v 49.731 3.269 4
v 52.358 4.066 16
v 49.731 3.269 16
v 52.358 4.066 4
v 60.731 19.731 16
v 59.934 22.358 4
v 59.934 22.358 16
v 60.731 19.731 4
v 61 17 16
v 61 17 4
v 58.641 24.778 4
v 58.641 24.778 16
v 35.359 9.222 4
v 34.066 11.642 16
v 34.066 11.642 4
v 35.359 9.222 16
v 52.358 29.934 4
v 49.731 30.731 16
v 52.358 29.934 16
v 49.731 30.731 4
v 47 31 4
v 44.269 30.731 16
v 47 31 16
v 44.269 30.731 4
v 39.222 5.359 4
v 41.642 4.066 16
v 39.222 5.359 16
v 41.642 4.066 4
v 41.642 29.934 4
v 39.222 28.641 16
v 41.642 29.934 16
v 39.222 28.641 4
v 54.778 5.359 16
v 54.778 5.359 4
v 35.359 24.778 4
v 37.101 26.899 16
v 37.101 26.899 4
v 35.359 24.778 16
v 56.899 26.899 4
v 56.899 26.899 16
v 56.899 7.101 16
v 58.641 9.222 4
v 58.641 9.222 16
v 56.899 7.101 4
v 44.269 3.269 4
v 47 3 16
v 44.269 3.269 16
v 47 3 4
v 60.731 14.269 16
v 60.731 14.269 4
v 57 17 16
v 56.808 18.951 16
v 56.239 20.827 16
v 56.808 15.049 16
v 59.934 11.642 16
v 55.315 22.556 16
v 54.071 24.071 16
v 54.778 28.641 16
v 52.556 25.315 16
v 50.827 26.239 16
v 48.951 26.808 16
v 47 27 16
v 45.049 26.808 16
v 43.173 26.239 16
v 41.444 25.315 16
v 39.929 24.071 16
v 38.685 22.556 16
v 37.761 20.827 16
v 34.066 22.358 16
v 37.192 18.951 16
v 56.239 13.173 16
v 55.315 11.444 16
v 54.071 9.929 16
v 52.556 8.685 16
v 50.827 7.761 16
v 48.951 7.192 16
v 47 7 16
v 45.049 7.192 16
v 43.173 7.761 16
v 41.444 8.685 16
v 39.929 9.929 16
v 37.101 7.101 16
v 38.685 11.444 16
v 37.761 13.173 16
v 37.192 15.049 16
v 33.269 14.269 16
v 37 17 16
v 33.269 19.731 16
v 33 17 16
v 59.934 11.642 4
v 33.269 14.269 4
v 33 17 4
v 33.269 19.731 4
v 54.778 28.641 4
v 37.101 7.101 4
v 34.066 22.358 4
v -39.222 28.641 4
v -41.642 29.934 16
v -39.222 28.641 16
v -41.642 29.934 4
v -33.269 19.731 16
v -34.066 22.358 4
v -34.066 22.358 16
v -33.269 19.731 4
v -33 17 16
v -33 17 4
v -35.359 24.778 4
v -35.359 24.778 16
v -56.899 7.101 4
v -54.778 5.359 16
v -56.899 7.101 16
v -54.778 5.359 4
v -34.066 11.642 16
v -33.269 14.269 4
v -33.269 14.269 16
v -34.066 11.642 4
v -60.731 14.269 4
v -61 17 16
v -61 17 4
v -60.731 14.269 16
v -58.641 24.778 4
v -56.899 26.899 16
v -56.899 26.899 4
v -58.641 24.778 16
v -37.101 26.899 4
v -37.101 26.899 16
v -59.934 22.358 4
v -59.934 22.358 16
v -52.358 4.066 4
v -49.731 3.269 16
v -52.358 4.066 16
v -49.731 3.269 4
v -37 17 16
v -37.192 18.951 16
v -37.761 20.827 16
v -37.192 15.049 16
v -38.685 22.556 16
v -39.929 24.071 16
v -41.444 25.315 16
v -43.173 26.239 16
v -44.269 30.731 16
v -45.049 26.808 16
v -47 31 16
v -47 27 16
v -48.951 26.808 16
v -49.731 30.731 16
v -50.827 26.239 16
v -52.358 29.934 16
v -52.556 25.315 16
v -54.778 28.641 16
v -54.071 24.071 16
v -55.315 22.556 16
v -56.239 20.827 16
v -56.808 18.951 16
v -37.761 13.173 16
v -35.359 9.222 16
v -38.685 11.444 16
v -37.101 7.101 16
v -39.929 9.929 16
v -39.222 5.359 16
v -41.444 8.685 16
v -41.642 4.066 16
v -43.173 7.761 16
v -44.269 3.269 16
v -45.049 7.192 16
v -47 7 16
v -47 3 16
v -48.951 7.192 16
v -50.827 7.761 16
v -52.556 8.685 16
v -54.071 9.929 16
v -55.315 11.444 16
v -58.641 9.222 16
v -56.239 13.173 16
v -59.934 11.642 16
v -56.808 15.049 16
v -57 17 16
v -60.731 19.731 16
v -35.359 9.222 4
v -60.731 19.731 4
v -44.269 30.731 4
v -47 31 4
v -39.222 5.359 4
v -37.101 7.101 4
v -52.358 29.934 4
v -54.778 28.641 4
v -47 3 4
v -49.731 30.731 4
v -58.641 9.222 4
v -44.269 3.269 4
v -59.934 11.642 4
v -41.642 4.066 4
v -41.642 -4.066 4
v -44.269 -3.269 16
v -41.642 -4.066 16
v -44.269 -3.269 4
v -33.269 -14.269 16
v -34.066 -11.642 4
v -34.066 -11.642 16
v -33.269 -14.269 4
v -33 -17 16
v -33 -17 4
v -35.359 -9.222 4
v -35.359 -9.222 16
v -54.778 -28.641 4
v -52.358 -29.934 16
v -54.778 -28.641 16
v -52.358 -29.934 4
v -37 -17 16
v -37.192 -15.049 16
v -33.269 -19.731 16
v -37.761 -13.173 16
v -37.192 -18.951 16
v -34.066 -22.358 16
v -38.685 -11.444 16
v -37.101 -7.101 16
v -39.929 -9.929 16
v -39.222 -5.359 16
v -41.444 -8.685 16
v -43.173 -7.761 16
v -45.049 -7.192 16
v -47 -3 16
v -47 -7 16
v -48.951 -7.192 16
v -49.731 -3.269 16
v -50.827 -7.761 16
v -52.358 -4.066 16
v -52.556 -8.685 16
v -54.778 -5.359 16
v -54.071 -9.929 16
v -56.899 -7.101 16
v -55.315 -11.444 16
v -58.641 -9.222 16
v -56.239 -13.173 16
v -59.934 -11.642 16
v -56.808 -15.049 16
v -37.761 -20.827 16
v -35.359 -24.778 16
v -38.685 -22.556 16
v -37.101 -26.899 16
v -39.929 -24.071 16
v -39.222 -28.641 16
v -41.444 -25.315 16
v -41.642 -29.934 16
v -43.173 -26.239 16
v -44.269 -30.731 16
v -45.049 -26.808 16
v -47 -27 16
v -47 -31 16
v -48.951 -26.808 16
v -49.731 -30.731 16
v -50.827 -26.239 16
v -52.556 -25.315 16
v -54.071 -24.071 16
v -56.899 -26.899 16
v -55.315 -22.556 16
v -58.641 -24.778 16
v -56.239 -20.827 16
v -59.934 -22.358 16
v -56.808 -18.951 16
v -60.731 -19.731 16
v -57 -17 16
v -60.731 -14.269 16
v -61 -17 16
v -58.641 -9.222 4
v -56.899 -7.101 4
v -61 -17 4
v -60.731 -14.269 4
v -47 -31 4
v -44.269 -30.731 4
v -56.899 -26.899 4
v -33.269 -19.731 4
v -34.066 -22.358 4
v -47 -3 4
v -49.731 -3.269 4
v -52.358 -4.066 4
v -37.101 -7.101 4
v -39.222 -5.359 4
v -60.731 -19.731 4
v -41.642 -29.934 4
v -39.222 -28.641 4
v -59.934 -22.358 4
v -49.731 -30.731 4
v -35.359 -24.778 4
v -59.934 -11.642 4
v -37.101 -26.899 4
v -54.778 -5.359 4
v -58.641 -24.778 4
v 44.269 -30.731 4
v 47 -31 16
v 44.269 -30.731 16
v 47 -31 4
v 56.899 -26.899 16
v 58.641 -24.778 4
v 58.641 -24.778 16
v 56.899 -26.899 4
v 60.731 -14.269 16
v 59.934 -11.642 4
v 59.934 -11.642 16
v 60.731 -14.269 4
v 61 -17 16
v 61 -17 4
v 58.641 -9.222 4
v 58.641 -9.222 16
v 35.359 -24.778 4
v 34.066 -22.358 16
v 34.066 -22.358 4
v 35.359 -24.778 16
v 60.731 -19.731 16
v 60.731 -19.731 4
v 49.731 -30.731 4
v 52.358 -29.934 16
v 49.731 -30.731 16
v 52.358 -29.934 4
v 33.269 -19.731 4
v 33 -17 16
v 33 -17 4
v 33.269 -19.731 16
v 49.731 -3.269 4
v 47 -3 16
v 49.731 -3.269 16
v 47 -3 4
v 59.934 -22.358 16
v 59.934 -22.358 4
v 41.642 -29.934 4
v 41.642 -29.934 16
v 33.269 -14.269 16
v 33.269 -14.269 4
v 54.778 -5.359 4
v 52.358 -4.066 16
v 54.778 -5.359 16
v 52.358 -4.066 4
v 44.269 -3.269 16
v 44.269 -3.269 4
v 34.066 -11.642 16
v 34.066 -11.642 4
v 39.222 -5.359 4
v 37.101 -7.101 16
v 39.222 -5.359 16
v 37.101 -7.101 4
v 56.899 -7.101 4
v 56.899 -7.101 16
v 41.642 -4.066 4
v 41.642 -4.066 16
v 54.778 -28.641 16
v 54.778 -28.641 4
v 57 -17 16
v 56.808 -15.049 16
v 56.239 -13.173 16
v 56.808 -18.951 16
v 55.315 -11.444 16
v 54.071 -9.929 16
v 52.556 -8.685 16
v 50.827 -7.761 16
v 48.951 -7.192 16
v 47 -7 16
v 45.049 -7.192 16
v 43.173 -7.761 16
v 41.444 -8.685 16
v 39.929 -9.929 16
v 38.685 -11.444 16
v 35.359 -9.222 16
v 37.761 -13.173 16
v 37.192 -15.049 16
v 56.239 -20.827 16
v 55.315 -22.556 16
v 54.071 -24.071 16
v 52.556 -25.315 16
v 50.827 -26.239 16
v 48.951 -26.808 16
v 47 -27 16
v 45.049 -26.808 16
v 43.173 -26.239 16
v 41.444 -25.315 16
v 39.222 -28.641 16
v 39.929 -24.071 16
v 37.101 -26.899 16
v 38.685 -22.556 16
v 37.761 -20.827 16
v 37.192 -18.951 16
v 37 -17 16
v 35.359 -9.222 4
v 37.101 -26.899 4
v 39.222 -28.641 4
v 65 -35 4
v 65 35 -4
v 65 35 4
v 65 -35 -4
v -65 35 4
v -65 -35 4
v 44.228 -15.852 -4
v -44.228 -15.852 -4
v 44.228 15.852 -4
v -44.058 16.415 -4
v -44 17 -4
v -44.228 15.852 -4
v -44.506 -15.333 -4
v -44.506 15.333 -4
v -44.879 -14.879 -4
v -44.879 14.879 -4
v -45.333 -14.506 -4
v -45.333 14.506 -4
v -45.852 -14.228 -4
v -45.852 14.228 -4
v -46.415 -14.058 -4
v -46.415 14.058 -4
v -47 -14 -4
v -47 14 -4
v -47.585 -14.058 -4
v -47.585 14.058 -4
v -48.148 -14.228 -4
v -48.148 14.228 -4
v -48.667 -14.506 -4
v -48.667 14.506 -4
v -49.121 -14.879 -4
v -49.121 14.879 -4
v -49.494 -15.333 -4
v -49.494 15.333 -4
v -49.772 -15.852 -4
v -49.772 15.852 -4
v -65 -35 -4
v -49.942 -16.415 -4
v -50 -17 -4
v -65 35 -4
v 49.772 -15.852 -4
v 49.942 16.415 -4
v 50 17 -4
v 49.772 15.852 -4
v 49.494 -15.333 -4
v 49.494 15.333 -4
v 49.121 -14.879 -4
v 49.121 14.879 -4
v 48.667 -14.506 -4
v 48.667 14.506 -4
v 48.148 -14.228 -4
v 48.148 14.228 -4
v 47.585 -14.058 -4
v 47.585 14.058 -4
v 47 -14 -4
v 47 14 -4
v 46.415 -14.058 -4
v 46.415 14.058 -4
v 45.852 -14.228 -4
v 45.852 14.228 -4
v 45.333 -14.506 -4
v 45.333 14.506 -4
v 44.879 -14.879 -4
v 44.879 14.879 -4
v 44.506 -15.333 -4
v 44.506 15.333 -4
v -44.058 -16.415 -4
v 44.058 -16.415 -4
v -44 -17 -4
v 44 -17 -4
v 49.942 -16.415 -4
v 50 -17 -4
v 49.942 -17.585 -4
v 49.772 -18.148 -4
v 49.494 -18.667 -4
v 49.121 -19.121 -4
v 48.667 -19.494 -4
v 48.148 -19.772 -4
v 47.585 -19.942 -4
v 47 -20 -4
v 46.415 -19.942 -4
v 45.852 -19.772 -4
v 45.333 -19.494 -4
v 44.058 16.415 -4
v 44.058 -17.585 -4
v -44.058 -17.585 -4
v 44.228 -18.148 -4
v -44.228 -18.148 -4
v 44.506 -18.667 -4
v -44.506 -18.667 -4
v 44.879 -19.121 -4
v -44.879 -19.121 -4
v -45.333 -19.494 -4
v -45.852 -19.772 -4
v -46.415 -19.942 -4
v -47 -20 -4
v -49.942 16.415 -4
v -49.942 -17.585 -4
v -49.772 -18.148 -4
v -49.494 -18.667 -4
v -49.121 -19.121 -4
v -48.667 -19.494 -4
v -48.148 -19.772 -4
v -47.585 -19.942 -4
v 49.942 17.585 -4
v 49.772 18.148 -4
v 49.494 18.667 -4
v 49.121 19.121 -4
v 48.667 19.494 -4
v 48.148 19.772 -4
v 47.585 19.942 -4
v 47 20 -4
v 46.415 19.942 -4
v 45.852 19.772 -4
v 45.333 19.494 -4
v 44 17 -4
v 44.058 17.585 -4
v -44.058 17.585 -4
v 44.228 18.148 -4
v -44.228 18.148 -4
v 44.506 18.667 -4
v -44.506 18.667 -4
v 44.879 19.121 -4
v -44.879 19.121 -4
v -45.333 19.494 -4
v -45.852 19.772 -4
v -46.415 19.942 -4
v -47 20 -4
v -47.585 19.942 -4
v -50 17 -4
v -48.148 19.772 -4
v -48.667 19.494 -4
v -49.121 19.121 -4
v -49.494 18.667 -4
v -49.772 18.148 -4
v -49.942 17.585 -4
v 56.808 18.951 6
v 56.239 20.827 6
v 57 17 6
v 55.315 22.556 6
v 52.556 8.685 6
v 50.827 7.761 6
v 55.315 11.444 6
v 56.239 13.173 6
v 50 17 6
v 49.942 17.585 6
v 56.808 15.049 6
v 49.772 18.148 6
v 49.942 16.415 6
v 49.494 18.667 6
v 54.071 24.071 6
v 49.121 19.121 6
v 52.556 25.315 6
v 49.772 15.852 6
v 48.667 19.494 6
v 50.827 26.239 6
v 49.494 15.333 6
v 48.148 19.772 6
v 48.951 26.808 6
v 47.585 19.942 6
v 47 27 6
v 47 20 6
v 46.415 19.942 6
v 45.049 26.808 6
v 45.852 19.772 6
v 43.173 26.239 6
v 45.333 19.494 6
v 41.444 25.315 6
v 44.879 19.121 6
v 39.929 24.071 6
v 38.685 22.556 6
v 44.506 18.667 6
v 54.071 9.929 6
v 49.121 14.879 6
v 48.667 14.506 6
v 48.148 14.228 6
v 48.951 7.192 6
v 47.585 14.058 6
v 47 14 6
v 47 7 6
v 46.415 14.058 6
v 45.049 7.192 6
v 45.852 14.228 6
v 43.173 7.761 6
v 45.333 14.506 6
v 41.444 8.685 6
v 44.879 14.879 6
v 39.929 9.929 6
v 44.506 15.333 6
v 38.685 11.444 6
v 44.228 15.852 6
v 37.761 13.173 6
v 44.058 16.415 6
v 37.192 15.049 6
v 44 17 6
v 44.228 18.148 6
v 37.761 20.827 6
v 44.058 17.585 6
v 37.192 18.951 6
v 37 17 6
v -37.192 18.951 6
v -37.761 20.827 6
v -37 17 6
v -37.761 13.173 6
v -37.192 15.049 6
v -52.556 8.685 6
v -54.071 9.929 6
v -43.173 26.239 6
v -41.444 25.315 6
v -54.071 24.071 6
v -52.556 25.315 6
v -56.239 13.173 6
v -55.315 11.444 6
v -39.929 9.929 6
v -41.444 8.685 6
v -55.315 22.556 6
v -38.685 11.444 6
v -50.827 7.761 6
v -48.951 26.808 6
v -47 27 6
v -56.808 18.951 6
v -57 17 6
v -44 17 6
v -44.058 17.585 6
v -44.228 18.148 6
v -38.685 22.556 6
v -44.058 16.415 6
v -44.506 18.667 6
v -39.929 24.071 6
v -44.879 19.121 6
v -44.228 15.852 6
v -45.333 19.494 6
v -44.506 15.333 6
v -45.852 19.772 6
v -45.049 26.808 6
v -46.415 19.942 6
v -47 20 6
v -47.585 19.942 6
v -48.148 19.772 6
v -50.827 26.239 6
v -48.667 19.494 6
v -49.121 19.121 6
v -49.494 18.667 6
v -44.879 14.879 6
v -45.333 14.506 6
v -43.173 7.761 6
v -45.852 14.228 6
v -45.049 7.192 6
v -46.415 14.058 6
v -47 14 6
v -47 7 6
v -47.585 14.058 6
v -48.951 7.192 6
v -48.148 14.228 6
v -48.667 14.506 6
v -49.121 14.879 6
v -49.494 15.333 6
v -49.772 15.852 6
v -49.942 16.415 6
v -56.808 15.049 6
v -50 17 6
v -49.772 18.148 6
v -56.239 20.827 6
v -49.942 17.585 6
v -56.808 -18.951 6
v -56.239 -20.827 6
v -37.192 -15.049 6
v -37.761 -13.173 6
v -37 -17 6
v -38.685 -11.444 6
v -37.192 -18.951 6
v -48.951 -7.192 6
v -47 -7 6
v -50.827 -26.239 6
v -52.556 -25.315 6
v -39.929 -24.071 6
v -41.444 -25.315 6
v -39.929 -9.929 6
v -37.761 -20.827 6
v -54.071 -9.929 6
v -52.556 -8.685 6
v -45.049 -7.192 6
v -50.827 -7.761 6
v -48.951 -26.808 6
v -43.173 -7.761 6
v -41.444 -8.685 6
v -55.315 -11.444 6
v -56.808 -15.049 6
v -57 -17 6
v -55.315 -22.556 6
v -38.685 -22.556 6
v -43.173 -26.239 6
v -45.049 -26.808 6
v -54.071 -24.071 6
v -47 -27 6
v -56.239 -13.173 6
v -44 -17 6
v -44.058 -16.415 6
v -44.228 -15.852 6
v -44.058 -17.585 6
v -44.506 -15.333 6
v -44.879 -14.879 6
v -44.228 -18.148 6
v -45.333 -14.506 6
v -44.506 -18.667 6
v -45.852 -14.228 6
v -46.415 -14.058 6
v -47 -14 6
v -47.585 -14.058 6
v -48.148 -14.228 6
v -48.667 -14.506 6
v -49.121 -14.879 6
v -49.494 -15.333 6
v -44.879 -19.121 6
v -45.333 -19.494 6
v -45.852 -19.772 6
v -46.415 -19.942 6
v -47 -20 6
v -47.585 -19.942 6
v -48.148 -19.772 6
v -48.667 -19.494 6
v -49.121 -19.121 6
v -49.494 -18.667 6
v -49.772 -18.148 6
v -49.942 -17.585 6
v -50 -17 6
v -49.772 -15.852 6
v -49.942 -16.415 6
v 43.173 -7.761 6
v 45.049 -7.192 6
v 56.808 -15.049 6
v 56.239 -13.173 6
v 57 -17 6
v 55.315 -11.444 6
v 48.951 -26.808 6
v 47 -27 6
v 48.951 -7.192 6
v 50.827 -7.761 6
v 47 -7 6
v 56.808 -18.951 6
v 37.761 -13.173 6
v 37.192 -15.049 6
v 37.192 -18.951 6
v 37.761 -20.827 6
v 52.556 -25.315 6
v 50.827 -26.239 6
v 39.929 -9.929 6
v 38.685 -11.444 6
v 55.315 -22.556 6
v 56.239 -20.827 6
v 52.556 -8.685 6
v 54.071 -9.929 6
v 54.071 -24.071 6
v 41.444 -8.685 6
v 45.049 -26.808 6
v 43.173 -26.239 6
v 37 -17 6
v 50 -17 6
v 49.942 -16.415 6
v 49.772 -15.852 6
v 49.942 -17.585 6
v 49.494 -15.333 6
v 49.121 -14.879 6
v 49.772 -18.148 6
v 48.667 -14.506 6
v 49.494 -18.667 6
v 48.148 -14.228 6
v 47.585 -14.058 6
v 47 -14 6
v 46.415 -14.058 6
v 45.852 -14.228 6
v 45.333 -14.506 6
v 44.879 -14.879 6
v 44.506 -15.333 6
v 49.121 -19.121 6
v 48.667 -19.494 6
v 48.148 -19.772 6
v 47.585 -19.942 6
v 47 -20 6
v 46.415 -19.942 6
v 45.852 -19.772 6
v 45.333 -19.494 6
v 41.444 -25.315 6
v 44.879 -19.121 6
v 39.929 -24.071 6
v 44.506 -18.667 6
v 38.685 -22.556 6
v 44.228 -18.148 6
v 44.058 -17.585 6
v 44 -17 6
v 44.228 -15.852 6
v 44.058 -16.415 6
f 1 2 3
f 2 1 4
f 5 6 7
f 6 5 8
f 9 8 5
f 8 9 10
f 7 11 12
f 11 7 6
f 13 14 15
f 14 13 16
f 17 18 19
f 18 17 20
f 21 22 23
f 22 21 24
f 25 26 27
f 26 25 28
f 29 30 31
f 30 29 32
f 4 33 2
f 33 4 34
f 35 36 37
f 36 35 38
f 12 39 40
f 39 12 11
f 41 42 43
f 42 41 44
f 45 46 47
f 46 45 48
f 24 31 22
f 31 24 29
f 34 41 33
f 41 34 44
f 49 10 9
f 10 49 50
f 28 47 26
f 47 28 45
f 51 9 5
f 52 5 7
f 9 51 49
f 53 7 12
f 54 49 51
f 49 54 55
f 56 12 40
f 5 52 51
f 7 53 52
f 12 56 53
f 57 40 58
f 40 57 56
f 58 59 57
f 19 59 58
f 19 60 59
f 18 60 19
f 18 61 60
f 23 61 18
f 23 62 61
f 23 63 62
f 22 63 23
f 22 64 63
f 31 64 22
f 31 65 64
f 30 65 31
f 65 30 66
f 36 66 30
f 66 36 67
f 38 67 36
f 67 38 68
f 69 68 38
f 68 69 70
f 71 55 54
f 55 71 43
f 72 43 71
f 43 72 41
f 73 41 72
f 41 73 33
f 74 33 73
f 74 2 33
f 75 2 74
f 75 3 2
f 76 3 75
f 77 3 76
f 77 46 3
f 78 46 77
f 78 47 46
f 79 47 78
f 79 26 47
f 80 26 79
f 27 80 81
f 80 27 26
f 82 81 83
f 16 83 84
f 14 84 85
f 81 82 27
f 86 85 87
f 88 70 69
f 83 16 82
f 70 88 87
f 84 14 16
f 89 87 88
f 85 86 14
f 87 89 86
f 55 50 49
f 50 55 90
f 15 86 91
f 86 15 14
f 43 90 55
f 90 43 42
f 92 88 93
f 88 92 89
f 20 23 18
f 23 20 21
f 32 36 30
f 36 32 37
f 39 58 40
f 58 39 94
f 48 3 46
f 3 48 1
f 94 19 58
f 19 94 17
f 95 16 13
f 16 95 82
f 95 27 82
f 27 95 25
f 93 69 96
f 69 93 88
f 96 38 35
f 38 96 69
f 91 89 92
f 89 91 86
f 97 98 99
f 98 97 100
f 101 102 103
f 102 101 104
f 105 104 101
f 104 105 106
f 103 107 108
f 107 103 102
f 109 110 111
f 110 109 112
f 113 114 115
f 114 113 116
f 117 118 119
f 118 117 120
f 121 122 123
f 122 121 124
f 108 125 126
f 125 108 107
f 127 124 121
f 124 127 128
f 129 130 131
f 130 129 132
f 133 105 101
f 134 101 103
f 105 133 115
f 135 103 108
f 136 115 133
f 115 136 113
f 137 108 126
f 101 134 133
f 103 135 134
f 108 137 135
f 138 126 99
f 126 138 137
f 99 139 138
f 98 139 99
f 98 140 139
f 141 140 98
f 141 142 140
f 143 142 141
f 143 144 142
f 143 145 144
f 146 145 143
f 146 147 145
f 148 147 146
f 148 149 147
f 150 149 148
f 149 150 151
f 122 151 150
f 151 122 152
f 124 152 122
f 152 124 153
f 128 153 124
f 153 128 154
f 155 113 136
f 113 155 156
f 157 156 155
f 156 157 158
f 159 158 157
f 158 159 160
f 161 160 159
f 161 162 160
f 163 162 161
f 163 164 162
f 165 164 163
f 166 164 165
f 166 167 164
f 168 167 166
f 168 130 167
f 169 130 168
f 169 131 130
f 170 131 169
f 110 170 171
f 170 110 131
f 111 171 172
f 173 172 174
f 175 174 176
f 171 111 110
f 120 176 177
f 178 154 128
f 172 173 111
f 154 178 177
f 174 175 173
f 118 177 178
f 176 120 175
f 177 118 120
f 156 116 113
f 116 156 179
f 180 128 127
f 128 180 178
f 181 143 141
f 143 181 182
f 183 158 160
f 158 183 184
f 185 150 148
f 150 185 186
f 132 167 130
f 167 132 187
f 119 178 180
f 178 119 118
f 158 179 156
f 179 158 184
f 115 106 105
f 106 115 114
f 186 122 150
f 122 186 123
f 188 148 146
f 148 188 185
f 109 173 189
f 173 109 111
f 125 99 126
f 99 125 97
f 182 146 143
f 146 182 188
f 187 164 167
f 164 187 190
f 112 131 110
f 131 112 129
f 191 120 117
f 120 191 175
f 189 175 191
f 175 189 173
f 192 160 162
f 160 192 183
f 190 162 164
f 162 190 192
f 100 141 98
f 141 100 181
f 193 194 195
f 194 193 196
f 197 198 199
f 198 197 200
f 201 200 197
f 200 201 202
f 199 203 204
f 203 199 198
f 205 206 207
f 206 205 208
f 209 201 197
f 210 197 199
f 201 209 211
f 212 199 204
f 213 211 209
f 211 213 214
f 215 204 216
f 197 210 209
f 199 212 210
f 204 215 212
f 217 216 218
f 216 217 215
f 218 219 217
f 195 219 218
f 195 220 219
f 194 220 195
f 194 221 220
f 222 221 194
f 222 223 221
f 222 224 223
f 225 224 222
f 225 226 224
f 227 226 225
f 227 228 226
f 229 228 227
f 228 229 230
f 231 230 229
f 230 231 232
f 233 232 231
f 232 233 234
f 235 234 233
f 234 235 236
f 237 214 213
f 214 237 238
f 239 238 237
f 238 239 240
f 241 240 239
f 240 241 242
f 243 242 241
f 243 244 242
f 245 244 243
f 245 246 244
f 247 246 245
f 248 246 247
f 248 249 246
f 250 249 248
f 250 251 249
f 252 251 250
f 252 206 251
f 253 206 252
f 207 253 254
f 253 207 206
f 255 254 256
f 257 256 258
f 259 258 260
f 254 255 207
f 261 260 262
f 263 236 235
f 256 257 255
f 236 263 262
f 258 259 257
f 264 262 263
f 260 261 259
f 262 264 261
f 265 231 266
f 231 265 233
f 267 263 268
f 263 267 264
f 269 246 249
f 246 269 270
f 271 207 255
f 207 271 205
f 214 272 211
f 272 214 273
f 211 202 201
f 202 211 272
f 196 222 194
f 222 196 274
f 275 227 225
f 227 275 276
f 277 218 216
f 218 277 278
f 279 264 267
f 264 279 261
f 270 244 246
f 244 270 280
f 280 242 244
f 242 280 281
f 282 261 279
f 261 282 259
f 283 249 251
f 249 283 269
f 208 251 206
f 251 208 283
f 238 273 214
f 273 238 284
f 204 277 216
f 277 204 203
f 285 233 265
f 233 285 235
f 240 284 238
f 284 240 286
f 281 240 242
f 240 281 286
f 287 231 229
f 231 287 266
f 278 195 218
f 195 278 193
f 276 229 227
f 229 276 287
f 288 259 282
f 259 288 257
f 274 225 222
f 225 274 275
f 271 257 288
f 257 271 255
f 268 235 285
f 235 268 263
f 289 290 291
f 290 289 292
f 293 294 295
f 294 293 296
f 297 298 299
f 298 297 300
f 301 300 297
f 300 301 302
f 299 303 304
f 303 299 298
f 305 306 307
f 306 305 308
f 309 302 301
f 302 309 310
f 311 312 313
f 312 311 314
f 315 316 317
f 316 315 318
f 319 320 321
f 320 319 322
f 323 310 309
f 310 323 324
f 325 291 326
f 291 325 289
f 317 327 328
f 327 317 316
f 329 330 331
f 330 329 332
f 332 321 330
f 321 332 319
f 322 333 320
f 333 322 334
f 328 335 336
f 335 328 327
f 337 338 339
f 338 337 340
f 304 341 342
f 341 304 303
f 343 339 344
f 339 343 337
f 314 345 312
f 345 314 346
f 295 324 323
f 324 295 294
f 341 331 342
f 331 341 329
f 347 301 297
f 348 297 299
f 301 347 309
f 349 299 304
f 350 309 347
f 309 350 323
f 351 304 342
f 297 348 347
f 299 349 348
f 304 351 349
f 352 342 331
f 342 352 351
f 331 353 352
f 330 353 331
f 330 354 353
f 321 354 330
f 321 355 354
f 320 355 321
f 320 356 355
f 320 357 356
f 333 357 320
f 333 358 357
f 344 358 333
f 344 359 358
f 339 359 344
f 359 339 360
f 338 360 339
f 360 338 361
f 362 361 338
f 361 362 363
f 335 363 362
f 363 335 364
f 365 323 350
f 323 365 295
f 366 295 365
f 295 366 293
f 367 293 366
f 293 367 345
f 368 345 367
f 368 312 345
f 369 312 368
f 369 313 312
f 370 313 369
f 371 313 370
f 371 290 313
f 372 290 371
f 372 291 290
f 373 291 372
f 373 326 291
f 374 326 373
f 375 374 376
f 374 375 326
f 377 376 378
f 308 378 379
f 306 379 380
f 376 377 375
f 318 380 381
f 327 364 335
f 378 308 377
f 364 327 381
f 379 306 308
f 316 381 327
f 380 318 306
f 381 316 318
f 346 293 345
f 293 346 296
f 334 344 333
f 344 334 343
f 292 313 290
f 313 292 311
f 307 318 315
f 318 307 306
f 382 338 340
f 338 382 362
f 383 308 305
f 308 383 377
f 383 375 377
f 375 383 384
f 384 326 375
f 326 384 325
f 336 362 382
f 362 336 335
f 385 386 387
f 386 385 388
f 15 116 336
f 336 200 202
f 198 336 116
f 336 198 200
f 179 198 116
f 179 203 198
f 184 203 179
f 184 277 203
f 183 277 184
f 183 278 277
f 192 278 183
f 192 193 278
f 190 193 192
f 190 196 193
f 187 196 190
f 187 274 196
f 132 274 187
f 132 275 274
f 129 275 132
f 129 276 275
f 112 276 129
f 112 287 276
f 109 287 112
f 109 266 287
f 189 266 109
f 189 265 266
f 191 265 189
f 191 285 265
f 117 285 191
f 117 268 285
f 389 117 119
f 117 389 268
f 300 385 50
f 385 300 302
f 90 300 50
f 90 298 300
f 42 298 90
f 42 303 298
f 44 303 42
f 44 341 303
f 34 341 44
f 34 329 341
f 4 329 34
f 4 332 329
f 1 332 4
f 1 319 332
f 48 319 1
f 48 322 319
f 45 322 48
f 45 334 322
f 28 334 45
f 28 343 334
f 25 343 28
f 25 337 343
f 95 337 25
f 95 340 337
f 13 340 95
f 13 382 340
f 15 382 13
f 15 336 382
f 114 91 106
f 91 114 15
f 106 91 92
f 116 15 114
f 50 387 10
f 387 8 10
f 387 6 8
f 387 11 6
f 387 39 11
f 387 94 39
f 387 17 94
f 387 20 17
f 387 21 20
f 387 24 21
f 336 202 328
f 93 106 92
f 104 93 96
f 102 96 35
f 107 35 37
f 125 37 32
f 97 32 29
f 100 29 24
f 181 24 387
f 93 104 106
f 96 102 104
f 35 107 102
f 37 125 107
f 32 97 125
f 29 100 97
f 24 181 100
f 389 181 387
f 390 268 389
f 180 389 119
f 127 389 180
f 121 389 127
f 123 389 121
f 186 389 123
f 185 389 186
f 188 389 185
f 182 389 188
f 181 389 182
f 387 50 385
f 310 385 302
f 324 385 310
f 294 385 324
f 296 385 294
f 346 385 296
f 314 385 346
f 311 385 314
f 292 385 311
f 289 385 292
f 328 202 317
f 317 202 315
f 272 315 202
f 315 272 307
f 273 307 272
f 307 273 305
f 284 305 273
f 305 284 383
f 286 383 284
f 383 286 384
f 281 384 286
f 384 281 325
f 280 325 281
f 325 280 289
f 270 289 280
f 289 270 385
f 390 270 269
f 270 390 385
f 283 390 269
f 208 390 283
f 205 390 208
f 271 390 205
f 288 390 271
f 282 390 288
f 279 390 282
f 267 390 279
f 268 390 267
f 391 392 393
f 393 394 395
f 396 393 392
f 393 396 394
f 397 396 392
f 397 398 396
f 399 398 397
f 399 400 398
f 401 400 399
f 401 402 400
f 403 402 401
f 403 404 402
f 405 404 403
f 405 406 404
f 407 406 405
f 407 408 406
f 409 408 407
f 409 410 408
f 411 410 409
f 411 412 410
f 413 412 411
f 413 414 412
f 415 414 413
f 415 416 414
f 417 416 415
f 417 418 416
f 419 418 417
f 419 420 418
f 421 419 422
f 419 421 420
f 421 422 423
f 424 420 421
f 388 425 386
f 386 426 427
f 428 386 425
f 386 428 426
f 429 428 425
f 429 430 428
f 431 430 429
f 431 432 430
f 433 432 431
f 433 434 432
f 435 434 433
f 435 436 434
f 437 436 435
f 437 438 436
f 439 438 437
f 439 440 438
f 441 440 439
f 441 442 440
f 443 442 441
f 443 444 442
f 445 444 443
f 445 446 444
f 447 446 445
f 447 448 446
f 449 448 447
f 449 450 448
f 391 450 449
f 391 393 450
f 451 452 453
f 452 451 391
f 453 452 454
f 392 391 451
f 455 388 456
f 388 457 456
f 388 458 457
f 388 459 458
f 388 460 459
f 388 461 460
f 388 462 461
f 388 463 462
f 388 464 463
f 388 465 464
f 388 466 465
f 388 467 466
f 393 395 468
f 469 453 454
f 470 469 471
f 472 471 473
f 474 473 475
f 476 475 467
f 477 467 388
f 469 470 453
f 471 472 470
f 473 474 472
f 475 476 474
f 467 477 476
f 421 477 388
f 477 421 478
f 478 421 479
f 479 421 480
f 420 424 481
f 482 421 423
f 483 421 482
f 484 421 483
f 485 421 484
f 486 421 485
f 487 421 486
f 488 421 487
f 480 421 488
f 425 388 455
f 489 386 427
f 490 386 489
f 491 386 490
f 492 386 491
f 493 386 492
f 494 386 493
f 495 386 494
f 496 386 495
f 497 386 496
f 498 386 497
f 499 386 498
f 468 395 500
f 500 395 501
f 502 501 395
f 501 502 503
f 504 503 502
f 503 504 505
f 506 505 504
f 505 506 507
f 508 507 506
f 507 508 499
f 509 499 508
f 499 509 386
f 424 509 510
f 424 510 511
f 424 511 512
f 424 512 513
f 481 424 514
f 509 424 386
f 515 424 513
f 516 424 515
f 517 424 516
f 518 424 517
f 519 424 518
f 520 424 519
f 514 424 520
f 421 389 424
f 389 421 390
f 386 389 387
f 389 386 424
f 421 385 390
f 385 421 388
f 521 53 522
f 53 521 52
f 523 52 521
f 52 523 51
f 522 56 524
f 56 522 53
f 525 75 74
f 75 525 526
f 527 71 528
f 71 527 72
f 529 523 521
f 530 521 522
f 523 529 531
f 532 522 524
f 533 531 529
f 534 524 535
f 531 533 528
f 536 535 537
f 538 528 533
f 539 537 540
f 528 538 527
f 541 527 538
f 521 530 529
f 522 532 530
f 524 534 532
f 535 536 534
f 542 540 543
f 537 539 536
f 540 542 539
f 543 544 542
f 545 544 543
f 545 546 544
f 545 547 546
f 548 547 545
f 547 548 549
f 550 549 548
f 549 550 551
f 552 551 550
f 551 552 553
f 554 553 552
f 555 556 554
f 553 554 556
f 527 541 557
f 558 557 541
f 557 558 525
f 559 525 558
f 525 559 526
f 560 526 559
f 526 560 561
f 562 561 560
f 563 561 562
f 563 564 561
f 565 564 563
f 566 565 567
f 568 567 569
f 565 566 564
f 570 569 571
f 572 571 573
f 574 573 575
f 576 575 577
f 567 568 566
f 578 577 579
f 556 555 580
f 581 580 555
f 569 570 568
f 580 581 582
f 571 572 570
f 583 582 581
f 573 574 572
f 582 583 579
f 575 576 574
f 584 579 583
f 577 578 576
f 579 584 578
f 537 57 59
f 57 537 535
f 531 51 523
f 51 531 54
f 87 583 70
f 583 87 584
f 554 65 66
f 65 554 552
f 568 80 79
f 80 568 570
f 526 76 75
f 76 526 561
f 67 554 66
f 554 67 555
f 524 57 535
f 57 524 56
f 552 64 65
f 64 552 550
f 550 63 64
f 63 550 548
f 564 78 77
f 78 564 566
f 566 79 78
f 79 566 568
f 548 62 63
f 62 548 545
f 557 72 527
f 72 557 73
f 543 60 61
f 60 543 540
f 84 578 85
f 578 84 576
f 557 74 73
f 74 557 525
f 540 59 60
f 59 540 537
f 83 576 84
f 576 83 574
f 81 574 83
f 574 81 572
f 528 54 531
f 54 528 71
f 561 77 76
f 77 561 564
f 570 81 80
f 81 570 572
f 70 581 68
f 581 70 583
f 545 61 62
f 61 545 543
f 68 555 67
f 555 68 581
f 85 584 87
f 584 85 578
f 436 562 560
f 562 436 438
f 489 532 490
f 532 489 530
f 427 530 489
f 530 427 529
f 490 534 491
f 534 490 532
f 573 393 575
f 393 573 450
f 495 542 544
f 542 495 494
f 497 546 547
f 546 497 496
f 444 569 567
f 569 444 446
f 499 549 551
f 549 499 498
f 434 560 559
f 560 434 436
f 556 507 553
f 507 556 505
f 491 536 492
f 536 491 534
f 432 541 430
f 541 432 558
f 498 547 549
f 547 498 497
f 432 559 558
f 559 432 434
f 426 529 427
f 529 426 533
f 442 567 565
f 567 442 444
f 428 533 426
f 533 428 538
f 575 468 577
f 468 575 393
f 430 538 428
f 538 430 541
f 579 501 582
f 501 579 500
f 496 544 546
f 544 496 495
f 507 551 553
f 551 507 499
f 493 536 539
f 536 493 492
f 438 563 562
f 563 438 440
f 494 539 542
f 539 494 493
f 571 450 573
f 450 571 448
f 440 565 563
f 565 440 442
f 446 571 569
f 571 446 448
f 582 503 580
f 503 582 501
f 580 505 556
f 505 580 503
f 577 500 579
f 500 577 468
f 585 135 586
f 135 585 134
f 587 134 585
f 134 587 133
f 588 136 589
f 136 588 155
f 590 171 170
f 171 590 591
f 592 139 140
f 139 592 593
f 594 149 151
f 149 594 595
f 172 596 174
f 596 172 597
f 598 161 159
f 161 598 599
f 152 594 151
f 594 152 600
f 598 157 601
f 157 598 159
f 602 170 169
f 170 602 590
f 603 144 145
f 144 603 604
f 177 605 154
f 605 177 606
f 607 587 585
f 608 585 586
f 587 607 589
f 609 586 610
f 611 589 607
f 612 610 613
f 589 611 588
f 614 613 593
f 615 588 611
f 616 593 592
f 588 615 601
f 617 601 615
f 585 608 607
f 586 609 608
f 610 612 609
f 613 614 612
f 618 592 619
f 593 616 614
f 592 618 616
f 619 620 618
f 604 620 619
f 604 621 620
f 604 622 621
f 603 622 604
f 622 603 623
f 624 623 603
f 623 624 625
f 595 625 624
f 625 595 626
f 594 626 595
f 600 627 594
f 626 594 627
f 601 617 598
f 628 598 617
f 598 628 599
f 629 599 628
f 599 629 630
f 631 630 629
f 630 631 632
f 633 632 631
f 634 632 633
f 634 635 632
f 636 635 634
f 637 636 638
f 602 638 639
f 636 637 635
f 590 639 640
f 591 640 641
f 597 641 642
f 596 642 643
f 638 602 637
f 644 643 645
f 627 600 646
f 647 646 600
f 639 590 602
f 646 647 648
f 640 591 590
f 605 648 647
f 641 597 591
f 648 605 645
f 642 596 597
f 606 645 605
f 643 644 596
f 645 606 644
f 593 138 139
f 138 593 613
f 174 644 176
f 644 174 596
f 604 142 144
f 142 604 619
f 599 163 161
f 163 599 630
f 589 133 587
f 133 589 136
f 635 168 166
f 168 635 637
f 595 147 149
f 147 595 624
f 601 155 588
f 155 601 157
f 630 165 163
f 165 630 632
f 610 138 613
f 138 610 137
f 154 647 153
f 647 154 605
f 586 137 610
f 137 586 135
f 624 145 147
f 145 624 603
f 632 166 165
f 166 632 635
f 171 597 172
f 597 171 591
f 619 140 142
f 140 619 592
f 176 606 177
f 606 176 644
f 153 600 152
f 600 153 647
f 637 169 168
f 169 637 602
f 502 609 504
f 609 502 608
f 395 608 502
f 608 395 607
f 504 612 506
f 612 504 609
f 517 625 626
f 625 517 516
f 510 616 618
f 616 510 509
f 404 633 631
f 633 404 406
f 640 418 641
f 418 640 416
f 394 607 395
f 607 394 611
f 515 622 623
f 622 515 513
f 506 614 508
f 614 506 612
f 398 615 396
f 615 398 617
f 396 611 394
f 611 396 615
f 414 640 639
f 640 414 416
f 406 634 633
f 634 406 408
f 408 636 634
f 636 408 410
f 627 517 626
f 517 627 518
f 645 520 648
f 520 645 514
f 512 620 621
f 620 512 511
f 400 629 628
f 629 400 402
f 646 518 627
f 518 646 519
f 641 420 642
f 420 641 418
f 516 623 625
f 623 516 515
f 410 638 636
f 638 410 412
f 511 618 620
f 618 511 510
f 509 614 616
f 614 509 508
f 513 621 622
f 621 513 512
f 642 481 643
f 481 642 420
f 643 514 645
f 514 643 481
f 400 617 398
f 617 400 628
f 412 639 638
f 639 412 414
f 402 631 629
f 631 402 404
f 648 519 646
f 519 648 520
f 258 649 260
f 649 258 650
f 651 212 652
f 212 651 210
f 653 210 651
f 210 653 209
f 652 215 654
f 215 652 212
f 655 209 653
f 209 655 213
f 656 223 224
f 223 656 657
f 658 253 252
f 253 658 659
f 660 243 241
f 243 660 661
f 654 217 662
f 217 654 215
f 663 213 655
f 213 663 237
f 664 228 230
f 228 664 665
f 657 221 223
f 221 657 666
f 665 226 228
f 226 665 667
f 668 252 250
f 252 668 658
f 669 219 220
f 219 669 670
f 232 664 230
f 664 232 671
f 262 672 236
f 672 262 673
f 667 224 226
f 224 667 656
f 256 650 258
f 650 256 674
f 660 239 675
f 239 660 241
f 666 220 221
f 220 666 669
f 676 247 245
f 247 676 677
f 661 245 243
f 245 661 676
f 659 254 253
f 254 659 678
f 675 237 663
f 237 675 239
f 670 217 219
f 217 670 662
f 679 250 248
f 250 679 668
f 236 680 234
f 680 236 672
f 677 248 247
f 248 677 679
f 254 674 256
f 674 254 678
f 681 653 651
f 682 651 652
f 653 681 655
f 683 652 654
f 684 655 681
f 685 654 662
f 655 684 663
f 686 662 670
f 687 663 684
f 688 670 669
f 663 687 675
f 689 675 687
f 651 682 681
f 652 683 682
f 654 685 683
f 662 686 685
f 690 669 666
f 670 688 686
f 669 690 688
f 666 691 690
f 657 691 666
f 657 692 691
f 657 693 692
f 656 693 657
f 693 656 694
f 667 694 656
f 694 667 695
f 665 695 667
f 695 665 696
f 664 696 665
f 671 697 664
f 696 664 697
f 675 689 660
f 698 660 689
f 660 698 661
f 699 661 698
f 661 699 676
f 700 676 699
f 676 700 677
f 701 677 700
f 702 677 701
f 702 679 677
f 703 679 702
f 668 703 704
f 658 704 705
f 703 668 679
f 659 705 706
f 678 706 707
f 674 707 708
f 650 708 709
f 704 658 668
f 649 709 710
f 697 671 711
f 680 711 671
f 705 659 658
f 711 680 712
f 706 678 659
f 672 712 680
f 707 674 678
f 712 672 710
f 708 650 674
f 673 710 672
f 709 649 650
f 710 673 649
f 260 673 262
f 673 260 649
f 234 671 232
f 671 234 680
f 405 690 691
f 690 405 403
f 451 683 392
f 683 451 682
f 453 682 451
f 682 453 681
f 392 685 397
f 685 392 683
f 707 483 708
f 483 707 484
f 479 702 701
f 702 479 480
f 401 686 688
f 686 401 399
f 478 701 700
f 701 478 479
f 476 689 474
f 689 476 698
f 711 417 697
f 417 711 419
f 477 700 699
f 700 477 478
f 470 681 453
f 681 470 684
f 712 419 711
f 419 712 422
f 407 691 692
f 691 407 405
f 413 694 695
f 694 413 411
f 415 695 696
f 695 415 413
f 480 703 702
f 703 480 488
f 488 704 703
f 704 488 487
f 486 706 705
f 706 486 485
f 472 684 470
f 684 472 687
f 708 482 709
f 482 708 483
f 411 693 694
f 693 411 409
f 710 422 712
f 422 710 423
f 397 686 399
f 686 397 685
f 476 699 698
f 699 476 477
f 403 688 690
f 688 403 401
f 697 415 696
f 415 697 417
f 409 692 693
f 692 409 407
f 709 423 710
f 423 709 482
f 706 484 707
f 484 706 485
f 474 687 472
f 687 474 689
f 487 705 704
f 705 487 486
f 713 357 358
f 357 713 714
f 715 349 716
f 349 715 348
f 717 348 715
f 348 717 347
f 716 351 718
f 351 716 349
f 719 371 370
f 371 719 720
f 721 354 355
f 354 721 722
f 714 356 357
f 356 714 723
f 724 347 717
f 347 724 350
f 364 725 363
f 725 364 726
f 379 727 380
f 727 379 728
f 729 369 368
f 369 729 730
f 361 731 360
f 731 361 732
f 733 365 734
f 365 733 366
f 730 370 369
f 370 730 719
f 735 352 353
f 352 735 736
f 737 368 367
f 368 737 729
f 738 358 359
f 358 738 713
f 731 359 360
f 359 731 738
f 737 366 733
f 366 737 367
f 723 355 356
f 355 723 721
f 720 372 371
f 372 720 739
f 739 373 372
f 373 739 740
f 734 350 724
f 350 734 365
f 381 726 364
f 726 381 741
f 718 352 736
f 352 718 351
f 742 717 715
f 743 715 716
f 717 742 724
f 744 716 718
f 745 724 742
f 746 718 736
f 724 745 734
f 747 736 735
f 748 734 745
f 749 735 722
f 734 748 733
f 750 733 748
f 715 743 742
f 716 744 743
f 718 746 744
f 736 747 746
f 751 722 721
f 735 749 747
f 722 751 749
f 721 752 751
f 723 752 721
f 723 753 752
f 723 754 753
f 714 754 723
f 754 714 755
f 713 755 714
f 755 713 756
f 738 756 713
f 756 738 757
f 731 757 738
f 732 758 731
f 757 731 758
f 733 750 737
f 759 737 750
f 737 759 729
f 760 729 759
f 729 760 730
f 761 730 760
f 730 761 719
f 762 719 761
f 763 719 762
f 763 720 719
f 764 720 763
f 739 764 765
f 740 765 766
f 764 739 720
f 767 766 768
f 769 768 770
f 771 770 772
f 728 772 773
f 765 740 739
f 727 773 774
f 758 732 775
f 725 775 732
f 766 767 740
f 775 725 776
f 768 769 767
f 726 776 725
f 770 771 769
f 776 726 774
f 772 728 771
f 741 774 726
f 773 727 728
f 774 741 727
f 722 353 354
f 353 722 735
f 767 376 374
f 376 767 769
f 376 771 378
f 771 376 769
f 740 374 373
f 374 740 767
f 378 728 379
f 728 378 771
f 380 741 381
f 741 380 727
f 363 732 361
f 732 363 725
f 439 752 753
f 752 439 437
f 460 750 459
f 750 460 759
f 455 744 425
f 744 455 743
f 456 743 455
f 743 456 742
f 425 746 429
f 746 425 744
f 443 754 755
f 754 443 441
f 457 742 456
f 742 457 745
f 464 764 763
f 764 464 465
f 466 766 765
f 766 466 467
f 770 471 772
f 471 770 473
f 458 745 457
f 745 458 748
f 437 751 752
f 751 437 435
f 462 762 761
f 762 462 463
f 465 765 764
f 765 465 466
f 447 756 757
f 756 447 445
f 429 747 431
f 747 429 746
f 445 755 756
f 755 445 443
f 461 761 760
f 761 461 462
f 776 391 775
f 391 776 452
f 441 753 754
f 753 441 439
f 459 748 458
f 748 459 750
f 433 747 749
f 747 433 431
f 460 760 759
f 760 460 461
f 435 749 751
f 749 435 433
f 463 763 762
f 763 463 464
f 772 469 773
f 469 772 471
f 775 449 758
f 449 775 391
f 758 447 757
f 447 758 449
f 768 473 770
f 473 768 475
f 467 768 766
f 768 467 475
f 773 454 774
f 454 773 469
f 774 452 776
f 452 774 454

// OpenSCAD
$fn = 32;

// ----------------------------------------------------------------------
// Socket pad plate
// bosses with counterbored sockets for the screws
// ----------------------------------------------------------------------

// --- parameters (mm) ---
base_t = 8;            // base plate thickness
boss_h = 12;           // boss height above the base plate
boss_d = 28;           // boss diameter
socket_d = 20;         // socket diameter
socket_depth = 10;     // socket depth from the boss face
bolt_d = 6;            // screw clearance hole through the socket floor
plate = [130, 70, 8];  // overall size (x, y, z)
edge = 18;             // boss centre offset from the plate edge
pads = 4;              // boss count, one per corner

// --- derived feature positions (mm) ---
height = base_t + boss_h;        // = 20   overall height of the part
corner_x = plate[0] / 2 - edge;  // = 47   boss centre X
corner_y = plate[1] / 2 - edge;  // = 17   boss centre Y
feature_centers = [
  [corner_x, corner_y],
  [-corner_x, corner_y],
  [-corner_x, -corner_y],
  [corner_x, -corner_y]
];   // boss centres: sockets, holes and the pads themselves are placed from here

// base plate, bosses on feature_centers, socket + through hole in each
difference() {
  union() {
    cube(plate, center = true);
    for (centre = feature_centers)
      translate([centre[0], centre[1], plate[2] / 2 - 1])
        cylinder(d = boss_d, h = boss_h + 1);
  }
  for (centre = feature_centers) {
    translate([centre[0], centre[1], plate[2] / 2 + boss_h - socket_depth])
      cylinder(d = socket_d, h = socket_depth + 1);
    translate([centre[0], centre[1], -height])
      cylinder(d = bolt_d, h = 2 * height + 2);  // through the socket floor
  }
}
